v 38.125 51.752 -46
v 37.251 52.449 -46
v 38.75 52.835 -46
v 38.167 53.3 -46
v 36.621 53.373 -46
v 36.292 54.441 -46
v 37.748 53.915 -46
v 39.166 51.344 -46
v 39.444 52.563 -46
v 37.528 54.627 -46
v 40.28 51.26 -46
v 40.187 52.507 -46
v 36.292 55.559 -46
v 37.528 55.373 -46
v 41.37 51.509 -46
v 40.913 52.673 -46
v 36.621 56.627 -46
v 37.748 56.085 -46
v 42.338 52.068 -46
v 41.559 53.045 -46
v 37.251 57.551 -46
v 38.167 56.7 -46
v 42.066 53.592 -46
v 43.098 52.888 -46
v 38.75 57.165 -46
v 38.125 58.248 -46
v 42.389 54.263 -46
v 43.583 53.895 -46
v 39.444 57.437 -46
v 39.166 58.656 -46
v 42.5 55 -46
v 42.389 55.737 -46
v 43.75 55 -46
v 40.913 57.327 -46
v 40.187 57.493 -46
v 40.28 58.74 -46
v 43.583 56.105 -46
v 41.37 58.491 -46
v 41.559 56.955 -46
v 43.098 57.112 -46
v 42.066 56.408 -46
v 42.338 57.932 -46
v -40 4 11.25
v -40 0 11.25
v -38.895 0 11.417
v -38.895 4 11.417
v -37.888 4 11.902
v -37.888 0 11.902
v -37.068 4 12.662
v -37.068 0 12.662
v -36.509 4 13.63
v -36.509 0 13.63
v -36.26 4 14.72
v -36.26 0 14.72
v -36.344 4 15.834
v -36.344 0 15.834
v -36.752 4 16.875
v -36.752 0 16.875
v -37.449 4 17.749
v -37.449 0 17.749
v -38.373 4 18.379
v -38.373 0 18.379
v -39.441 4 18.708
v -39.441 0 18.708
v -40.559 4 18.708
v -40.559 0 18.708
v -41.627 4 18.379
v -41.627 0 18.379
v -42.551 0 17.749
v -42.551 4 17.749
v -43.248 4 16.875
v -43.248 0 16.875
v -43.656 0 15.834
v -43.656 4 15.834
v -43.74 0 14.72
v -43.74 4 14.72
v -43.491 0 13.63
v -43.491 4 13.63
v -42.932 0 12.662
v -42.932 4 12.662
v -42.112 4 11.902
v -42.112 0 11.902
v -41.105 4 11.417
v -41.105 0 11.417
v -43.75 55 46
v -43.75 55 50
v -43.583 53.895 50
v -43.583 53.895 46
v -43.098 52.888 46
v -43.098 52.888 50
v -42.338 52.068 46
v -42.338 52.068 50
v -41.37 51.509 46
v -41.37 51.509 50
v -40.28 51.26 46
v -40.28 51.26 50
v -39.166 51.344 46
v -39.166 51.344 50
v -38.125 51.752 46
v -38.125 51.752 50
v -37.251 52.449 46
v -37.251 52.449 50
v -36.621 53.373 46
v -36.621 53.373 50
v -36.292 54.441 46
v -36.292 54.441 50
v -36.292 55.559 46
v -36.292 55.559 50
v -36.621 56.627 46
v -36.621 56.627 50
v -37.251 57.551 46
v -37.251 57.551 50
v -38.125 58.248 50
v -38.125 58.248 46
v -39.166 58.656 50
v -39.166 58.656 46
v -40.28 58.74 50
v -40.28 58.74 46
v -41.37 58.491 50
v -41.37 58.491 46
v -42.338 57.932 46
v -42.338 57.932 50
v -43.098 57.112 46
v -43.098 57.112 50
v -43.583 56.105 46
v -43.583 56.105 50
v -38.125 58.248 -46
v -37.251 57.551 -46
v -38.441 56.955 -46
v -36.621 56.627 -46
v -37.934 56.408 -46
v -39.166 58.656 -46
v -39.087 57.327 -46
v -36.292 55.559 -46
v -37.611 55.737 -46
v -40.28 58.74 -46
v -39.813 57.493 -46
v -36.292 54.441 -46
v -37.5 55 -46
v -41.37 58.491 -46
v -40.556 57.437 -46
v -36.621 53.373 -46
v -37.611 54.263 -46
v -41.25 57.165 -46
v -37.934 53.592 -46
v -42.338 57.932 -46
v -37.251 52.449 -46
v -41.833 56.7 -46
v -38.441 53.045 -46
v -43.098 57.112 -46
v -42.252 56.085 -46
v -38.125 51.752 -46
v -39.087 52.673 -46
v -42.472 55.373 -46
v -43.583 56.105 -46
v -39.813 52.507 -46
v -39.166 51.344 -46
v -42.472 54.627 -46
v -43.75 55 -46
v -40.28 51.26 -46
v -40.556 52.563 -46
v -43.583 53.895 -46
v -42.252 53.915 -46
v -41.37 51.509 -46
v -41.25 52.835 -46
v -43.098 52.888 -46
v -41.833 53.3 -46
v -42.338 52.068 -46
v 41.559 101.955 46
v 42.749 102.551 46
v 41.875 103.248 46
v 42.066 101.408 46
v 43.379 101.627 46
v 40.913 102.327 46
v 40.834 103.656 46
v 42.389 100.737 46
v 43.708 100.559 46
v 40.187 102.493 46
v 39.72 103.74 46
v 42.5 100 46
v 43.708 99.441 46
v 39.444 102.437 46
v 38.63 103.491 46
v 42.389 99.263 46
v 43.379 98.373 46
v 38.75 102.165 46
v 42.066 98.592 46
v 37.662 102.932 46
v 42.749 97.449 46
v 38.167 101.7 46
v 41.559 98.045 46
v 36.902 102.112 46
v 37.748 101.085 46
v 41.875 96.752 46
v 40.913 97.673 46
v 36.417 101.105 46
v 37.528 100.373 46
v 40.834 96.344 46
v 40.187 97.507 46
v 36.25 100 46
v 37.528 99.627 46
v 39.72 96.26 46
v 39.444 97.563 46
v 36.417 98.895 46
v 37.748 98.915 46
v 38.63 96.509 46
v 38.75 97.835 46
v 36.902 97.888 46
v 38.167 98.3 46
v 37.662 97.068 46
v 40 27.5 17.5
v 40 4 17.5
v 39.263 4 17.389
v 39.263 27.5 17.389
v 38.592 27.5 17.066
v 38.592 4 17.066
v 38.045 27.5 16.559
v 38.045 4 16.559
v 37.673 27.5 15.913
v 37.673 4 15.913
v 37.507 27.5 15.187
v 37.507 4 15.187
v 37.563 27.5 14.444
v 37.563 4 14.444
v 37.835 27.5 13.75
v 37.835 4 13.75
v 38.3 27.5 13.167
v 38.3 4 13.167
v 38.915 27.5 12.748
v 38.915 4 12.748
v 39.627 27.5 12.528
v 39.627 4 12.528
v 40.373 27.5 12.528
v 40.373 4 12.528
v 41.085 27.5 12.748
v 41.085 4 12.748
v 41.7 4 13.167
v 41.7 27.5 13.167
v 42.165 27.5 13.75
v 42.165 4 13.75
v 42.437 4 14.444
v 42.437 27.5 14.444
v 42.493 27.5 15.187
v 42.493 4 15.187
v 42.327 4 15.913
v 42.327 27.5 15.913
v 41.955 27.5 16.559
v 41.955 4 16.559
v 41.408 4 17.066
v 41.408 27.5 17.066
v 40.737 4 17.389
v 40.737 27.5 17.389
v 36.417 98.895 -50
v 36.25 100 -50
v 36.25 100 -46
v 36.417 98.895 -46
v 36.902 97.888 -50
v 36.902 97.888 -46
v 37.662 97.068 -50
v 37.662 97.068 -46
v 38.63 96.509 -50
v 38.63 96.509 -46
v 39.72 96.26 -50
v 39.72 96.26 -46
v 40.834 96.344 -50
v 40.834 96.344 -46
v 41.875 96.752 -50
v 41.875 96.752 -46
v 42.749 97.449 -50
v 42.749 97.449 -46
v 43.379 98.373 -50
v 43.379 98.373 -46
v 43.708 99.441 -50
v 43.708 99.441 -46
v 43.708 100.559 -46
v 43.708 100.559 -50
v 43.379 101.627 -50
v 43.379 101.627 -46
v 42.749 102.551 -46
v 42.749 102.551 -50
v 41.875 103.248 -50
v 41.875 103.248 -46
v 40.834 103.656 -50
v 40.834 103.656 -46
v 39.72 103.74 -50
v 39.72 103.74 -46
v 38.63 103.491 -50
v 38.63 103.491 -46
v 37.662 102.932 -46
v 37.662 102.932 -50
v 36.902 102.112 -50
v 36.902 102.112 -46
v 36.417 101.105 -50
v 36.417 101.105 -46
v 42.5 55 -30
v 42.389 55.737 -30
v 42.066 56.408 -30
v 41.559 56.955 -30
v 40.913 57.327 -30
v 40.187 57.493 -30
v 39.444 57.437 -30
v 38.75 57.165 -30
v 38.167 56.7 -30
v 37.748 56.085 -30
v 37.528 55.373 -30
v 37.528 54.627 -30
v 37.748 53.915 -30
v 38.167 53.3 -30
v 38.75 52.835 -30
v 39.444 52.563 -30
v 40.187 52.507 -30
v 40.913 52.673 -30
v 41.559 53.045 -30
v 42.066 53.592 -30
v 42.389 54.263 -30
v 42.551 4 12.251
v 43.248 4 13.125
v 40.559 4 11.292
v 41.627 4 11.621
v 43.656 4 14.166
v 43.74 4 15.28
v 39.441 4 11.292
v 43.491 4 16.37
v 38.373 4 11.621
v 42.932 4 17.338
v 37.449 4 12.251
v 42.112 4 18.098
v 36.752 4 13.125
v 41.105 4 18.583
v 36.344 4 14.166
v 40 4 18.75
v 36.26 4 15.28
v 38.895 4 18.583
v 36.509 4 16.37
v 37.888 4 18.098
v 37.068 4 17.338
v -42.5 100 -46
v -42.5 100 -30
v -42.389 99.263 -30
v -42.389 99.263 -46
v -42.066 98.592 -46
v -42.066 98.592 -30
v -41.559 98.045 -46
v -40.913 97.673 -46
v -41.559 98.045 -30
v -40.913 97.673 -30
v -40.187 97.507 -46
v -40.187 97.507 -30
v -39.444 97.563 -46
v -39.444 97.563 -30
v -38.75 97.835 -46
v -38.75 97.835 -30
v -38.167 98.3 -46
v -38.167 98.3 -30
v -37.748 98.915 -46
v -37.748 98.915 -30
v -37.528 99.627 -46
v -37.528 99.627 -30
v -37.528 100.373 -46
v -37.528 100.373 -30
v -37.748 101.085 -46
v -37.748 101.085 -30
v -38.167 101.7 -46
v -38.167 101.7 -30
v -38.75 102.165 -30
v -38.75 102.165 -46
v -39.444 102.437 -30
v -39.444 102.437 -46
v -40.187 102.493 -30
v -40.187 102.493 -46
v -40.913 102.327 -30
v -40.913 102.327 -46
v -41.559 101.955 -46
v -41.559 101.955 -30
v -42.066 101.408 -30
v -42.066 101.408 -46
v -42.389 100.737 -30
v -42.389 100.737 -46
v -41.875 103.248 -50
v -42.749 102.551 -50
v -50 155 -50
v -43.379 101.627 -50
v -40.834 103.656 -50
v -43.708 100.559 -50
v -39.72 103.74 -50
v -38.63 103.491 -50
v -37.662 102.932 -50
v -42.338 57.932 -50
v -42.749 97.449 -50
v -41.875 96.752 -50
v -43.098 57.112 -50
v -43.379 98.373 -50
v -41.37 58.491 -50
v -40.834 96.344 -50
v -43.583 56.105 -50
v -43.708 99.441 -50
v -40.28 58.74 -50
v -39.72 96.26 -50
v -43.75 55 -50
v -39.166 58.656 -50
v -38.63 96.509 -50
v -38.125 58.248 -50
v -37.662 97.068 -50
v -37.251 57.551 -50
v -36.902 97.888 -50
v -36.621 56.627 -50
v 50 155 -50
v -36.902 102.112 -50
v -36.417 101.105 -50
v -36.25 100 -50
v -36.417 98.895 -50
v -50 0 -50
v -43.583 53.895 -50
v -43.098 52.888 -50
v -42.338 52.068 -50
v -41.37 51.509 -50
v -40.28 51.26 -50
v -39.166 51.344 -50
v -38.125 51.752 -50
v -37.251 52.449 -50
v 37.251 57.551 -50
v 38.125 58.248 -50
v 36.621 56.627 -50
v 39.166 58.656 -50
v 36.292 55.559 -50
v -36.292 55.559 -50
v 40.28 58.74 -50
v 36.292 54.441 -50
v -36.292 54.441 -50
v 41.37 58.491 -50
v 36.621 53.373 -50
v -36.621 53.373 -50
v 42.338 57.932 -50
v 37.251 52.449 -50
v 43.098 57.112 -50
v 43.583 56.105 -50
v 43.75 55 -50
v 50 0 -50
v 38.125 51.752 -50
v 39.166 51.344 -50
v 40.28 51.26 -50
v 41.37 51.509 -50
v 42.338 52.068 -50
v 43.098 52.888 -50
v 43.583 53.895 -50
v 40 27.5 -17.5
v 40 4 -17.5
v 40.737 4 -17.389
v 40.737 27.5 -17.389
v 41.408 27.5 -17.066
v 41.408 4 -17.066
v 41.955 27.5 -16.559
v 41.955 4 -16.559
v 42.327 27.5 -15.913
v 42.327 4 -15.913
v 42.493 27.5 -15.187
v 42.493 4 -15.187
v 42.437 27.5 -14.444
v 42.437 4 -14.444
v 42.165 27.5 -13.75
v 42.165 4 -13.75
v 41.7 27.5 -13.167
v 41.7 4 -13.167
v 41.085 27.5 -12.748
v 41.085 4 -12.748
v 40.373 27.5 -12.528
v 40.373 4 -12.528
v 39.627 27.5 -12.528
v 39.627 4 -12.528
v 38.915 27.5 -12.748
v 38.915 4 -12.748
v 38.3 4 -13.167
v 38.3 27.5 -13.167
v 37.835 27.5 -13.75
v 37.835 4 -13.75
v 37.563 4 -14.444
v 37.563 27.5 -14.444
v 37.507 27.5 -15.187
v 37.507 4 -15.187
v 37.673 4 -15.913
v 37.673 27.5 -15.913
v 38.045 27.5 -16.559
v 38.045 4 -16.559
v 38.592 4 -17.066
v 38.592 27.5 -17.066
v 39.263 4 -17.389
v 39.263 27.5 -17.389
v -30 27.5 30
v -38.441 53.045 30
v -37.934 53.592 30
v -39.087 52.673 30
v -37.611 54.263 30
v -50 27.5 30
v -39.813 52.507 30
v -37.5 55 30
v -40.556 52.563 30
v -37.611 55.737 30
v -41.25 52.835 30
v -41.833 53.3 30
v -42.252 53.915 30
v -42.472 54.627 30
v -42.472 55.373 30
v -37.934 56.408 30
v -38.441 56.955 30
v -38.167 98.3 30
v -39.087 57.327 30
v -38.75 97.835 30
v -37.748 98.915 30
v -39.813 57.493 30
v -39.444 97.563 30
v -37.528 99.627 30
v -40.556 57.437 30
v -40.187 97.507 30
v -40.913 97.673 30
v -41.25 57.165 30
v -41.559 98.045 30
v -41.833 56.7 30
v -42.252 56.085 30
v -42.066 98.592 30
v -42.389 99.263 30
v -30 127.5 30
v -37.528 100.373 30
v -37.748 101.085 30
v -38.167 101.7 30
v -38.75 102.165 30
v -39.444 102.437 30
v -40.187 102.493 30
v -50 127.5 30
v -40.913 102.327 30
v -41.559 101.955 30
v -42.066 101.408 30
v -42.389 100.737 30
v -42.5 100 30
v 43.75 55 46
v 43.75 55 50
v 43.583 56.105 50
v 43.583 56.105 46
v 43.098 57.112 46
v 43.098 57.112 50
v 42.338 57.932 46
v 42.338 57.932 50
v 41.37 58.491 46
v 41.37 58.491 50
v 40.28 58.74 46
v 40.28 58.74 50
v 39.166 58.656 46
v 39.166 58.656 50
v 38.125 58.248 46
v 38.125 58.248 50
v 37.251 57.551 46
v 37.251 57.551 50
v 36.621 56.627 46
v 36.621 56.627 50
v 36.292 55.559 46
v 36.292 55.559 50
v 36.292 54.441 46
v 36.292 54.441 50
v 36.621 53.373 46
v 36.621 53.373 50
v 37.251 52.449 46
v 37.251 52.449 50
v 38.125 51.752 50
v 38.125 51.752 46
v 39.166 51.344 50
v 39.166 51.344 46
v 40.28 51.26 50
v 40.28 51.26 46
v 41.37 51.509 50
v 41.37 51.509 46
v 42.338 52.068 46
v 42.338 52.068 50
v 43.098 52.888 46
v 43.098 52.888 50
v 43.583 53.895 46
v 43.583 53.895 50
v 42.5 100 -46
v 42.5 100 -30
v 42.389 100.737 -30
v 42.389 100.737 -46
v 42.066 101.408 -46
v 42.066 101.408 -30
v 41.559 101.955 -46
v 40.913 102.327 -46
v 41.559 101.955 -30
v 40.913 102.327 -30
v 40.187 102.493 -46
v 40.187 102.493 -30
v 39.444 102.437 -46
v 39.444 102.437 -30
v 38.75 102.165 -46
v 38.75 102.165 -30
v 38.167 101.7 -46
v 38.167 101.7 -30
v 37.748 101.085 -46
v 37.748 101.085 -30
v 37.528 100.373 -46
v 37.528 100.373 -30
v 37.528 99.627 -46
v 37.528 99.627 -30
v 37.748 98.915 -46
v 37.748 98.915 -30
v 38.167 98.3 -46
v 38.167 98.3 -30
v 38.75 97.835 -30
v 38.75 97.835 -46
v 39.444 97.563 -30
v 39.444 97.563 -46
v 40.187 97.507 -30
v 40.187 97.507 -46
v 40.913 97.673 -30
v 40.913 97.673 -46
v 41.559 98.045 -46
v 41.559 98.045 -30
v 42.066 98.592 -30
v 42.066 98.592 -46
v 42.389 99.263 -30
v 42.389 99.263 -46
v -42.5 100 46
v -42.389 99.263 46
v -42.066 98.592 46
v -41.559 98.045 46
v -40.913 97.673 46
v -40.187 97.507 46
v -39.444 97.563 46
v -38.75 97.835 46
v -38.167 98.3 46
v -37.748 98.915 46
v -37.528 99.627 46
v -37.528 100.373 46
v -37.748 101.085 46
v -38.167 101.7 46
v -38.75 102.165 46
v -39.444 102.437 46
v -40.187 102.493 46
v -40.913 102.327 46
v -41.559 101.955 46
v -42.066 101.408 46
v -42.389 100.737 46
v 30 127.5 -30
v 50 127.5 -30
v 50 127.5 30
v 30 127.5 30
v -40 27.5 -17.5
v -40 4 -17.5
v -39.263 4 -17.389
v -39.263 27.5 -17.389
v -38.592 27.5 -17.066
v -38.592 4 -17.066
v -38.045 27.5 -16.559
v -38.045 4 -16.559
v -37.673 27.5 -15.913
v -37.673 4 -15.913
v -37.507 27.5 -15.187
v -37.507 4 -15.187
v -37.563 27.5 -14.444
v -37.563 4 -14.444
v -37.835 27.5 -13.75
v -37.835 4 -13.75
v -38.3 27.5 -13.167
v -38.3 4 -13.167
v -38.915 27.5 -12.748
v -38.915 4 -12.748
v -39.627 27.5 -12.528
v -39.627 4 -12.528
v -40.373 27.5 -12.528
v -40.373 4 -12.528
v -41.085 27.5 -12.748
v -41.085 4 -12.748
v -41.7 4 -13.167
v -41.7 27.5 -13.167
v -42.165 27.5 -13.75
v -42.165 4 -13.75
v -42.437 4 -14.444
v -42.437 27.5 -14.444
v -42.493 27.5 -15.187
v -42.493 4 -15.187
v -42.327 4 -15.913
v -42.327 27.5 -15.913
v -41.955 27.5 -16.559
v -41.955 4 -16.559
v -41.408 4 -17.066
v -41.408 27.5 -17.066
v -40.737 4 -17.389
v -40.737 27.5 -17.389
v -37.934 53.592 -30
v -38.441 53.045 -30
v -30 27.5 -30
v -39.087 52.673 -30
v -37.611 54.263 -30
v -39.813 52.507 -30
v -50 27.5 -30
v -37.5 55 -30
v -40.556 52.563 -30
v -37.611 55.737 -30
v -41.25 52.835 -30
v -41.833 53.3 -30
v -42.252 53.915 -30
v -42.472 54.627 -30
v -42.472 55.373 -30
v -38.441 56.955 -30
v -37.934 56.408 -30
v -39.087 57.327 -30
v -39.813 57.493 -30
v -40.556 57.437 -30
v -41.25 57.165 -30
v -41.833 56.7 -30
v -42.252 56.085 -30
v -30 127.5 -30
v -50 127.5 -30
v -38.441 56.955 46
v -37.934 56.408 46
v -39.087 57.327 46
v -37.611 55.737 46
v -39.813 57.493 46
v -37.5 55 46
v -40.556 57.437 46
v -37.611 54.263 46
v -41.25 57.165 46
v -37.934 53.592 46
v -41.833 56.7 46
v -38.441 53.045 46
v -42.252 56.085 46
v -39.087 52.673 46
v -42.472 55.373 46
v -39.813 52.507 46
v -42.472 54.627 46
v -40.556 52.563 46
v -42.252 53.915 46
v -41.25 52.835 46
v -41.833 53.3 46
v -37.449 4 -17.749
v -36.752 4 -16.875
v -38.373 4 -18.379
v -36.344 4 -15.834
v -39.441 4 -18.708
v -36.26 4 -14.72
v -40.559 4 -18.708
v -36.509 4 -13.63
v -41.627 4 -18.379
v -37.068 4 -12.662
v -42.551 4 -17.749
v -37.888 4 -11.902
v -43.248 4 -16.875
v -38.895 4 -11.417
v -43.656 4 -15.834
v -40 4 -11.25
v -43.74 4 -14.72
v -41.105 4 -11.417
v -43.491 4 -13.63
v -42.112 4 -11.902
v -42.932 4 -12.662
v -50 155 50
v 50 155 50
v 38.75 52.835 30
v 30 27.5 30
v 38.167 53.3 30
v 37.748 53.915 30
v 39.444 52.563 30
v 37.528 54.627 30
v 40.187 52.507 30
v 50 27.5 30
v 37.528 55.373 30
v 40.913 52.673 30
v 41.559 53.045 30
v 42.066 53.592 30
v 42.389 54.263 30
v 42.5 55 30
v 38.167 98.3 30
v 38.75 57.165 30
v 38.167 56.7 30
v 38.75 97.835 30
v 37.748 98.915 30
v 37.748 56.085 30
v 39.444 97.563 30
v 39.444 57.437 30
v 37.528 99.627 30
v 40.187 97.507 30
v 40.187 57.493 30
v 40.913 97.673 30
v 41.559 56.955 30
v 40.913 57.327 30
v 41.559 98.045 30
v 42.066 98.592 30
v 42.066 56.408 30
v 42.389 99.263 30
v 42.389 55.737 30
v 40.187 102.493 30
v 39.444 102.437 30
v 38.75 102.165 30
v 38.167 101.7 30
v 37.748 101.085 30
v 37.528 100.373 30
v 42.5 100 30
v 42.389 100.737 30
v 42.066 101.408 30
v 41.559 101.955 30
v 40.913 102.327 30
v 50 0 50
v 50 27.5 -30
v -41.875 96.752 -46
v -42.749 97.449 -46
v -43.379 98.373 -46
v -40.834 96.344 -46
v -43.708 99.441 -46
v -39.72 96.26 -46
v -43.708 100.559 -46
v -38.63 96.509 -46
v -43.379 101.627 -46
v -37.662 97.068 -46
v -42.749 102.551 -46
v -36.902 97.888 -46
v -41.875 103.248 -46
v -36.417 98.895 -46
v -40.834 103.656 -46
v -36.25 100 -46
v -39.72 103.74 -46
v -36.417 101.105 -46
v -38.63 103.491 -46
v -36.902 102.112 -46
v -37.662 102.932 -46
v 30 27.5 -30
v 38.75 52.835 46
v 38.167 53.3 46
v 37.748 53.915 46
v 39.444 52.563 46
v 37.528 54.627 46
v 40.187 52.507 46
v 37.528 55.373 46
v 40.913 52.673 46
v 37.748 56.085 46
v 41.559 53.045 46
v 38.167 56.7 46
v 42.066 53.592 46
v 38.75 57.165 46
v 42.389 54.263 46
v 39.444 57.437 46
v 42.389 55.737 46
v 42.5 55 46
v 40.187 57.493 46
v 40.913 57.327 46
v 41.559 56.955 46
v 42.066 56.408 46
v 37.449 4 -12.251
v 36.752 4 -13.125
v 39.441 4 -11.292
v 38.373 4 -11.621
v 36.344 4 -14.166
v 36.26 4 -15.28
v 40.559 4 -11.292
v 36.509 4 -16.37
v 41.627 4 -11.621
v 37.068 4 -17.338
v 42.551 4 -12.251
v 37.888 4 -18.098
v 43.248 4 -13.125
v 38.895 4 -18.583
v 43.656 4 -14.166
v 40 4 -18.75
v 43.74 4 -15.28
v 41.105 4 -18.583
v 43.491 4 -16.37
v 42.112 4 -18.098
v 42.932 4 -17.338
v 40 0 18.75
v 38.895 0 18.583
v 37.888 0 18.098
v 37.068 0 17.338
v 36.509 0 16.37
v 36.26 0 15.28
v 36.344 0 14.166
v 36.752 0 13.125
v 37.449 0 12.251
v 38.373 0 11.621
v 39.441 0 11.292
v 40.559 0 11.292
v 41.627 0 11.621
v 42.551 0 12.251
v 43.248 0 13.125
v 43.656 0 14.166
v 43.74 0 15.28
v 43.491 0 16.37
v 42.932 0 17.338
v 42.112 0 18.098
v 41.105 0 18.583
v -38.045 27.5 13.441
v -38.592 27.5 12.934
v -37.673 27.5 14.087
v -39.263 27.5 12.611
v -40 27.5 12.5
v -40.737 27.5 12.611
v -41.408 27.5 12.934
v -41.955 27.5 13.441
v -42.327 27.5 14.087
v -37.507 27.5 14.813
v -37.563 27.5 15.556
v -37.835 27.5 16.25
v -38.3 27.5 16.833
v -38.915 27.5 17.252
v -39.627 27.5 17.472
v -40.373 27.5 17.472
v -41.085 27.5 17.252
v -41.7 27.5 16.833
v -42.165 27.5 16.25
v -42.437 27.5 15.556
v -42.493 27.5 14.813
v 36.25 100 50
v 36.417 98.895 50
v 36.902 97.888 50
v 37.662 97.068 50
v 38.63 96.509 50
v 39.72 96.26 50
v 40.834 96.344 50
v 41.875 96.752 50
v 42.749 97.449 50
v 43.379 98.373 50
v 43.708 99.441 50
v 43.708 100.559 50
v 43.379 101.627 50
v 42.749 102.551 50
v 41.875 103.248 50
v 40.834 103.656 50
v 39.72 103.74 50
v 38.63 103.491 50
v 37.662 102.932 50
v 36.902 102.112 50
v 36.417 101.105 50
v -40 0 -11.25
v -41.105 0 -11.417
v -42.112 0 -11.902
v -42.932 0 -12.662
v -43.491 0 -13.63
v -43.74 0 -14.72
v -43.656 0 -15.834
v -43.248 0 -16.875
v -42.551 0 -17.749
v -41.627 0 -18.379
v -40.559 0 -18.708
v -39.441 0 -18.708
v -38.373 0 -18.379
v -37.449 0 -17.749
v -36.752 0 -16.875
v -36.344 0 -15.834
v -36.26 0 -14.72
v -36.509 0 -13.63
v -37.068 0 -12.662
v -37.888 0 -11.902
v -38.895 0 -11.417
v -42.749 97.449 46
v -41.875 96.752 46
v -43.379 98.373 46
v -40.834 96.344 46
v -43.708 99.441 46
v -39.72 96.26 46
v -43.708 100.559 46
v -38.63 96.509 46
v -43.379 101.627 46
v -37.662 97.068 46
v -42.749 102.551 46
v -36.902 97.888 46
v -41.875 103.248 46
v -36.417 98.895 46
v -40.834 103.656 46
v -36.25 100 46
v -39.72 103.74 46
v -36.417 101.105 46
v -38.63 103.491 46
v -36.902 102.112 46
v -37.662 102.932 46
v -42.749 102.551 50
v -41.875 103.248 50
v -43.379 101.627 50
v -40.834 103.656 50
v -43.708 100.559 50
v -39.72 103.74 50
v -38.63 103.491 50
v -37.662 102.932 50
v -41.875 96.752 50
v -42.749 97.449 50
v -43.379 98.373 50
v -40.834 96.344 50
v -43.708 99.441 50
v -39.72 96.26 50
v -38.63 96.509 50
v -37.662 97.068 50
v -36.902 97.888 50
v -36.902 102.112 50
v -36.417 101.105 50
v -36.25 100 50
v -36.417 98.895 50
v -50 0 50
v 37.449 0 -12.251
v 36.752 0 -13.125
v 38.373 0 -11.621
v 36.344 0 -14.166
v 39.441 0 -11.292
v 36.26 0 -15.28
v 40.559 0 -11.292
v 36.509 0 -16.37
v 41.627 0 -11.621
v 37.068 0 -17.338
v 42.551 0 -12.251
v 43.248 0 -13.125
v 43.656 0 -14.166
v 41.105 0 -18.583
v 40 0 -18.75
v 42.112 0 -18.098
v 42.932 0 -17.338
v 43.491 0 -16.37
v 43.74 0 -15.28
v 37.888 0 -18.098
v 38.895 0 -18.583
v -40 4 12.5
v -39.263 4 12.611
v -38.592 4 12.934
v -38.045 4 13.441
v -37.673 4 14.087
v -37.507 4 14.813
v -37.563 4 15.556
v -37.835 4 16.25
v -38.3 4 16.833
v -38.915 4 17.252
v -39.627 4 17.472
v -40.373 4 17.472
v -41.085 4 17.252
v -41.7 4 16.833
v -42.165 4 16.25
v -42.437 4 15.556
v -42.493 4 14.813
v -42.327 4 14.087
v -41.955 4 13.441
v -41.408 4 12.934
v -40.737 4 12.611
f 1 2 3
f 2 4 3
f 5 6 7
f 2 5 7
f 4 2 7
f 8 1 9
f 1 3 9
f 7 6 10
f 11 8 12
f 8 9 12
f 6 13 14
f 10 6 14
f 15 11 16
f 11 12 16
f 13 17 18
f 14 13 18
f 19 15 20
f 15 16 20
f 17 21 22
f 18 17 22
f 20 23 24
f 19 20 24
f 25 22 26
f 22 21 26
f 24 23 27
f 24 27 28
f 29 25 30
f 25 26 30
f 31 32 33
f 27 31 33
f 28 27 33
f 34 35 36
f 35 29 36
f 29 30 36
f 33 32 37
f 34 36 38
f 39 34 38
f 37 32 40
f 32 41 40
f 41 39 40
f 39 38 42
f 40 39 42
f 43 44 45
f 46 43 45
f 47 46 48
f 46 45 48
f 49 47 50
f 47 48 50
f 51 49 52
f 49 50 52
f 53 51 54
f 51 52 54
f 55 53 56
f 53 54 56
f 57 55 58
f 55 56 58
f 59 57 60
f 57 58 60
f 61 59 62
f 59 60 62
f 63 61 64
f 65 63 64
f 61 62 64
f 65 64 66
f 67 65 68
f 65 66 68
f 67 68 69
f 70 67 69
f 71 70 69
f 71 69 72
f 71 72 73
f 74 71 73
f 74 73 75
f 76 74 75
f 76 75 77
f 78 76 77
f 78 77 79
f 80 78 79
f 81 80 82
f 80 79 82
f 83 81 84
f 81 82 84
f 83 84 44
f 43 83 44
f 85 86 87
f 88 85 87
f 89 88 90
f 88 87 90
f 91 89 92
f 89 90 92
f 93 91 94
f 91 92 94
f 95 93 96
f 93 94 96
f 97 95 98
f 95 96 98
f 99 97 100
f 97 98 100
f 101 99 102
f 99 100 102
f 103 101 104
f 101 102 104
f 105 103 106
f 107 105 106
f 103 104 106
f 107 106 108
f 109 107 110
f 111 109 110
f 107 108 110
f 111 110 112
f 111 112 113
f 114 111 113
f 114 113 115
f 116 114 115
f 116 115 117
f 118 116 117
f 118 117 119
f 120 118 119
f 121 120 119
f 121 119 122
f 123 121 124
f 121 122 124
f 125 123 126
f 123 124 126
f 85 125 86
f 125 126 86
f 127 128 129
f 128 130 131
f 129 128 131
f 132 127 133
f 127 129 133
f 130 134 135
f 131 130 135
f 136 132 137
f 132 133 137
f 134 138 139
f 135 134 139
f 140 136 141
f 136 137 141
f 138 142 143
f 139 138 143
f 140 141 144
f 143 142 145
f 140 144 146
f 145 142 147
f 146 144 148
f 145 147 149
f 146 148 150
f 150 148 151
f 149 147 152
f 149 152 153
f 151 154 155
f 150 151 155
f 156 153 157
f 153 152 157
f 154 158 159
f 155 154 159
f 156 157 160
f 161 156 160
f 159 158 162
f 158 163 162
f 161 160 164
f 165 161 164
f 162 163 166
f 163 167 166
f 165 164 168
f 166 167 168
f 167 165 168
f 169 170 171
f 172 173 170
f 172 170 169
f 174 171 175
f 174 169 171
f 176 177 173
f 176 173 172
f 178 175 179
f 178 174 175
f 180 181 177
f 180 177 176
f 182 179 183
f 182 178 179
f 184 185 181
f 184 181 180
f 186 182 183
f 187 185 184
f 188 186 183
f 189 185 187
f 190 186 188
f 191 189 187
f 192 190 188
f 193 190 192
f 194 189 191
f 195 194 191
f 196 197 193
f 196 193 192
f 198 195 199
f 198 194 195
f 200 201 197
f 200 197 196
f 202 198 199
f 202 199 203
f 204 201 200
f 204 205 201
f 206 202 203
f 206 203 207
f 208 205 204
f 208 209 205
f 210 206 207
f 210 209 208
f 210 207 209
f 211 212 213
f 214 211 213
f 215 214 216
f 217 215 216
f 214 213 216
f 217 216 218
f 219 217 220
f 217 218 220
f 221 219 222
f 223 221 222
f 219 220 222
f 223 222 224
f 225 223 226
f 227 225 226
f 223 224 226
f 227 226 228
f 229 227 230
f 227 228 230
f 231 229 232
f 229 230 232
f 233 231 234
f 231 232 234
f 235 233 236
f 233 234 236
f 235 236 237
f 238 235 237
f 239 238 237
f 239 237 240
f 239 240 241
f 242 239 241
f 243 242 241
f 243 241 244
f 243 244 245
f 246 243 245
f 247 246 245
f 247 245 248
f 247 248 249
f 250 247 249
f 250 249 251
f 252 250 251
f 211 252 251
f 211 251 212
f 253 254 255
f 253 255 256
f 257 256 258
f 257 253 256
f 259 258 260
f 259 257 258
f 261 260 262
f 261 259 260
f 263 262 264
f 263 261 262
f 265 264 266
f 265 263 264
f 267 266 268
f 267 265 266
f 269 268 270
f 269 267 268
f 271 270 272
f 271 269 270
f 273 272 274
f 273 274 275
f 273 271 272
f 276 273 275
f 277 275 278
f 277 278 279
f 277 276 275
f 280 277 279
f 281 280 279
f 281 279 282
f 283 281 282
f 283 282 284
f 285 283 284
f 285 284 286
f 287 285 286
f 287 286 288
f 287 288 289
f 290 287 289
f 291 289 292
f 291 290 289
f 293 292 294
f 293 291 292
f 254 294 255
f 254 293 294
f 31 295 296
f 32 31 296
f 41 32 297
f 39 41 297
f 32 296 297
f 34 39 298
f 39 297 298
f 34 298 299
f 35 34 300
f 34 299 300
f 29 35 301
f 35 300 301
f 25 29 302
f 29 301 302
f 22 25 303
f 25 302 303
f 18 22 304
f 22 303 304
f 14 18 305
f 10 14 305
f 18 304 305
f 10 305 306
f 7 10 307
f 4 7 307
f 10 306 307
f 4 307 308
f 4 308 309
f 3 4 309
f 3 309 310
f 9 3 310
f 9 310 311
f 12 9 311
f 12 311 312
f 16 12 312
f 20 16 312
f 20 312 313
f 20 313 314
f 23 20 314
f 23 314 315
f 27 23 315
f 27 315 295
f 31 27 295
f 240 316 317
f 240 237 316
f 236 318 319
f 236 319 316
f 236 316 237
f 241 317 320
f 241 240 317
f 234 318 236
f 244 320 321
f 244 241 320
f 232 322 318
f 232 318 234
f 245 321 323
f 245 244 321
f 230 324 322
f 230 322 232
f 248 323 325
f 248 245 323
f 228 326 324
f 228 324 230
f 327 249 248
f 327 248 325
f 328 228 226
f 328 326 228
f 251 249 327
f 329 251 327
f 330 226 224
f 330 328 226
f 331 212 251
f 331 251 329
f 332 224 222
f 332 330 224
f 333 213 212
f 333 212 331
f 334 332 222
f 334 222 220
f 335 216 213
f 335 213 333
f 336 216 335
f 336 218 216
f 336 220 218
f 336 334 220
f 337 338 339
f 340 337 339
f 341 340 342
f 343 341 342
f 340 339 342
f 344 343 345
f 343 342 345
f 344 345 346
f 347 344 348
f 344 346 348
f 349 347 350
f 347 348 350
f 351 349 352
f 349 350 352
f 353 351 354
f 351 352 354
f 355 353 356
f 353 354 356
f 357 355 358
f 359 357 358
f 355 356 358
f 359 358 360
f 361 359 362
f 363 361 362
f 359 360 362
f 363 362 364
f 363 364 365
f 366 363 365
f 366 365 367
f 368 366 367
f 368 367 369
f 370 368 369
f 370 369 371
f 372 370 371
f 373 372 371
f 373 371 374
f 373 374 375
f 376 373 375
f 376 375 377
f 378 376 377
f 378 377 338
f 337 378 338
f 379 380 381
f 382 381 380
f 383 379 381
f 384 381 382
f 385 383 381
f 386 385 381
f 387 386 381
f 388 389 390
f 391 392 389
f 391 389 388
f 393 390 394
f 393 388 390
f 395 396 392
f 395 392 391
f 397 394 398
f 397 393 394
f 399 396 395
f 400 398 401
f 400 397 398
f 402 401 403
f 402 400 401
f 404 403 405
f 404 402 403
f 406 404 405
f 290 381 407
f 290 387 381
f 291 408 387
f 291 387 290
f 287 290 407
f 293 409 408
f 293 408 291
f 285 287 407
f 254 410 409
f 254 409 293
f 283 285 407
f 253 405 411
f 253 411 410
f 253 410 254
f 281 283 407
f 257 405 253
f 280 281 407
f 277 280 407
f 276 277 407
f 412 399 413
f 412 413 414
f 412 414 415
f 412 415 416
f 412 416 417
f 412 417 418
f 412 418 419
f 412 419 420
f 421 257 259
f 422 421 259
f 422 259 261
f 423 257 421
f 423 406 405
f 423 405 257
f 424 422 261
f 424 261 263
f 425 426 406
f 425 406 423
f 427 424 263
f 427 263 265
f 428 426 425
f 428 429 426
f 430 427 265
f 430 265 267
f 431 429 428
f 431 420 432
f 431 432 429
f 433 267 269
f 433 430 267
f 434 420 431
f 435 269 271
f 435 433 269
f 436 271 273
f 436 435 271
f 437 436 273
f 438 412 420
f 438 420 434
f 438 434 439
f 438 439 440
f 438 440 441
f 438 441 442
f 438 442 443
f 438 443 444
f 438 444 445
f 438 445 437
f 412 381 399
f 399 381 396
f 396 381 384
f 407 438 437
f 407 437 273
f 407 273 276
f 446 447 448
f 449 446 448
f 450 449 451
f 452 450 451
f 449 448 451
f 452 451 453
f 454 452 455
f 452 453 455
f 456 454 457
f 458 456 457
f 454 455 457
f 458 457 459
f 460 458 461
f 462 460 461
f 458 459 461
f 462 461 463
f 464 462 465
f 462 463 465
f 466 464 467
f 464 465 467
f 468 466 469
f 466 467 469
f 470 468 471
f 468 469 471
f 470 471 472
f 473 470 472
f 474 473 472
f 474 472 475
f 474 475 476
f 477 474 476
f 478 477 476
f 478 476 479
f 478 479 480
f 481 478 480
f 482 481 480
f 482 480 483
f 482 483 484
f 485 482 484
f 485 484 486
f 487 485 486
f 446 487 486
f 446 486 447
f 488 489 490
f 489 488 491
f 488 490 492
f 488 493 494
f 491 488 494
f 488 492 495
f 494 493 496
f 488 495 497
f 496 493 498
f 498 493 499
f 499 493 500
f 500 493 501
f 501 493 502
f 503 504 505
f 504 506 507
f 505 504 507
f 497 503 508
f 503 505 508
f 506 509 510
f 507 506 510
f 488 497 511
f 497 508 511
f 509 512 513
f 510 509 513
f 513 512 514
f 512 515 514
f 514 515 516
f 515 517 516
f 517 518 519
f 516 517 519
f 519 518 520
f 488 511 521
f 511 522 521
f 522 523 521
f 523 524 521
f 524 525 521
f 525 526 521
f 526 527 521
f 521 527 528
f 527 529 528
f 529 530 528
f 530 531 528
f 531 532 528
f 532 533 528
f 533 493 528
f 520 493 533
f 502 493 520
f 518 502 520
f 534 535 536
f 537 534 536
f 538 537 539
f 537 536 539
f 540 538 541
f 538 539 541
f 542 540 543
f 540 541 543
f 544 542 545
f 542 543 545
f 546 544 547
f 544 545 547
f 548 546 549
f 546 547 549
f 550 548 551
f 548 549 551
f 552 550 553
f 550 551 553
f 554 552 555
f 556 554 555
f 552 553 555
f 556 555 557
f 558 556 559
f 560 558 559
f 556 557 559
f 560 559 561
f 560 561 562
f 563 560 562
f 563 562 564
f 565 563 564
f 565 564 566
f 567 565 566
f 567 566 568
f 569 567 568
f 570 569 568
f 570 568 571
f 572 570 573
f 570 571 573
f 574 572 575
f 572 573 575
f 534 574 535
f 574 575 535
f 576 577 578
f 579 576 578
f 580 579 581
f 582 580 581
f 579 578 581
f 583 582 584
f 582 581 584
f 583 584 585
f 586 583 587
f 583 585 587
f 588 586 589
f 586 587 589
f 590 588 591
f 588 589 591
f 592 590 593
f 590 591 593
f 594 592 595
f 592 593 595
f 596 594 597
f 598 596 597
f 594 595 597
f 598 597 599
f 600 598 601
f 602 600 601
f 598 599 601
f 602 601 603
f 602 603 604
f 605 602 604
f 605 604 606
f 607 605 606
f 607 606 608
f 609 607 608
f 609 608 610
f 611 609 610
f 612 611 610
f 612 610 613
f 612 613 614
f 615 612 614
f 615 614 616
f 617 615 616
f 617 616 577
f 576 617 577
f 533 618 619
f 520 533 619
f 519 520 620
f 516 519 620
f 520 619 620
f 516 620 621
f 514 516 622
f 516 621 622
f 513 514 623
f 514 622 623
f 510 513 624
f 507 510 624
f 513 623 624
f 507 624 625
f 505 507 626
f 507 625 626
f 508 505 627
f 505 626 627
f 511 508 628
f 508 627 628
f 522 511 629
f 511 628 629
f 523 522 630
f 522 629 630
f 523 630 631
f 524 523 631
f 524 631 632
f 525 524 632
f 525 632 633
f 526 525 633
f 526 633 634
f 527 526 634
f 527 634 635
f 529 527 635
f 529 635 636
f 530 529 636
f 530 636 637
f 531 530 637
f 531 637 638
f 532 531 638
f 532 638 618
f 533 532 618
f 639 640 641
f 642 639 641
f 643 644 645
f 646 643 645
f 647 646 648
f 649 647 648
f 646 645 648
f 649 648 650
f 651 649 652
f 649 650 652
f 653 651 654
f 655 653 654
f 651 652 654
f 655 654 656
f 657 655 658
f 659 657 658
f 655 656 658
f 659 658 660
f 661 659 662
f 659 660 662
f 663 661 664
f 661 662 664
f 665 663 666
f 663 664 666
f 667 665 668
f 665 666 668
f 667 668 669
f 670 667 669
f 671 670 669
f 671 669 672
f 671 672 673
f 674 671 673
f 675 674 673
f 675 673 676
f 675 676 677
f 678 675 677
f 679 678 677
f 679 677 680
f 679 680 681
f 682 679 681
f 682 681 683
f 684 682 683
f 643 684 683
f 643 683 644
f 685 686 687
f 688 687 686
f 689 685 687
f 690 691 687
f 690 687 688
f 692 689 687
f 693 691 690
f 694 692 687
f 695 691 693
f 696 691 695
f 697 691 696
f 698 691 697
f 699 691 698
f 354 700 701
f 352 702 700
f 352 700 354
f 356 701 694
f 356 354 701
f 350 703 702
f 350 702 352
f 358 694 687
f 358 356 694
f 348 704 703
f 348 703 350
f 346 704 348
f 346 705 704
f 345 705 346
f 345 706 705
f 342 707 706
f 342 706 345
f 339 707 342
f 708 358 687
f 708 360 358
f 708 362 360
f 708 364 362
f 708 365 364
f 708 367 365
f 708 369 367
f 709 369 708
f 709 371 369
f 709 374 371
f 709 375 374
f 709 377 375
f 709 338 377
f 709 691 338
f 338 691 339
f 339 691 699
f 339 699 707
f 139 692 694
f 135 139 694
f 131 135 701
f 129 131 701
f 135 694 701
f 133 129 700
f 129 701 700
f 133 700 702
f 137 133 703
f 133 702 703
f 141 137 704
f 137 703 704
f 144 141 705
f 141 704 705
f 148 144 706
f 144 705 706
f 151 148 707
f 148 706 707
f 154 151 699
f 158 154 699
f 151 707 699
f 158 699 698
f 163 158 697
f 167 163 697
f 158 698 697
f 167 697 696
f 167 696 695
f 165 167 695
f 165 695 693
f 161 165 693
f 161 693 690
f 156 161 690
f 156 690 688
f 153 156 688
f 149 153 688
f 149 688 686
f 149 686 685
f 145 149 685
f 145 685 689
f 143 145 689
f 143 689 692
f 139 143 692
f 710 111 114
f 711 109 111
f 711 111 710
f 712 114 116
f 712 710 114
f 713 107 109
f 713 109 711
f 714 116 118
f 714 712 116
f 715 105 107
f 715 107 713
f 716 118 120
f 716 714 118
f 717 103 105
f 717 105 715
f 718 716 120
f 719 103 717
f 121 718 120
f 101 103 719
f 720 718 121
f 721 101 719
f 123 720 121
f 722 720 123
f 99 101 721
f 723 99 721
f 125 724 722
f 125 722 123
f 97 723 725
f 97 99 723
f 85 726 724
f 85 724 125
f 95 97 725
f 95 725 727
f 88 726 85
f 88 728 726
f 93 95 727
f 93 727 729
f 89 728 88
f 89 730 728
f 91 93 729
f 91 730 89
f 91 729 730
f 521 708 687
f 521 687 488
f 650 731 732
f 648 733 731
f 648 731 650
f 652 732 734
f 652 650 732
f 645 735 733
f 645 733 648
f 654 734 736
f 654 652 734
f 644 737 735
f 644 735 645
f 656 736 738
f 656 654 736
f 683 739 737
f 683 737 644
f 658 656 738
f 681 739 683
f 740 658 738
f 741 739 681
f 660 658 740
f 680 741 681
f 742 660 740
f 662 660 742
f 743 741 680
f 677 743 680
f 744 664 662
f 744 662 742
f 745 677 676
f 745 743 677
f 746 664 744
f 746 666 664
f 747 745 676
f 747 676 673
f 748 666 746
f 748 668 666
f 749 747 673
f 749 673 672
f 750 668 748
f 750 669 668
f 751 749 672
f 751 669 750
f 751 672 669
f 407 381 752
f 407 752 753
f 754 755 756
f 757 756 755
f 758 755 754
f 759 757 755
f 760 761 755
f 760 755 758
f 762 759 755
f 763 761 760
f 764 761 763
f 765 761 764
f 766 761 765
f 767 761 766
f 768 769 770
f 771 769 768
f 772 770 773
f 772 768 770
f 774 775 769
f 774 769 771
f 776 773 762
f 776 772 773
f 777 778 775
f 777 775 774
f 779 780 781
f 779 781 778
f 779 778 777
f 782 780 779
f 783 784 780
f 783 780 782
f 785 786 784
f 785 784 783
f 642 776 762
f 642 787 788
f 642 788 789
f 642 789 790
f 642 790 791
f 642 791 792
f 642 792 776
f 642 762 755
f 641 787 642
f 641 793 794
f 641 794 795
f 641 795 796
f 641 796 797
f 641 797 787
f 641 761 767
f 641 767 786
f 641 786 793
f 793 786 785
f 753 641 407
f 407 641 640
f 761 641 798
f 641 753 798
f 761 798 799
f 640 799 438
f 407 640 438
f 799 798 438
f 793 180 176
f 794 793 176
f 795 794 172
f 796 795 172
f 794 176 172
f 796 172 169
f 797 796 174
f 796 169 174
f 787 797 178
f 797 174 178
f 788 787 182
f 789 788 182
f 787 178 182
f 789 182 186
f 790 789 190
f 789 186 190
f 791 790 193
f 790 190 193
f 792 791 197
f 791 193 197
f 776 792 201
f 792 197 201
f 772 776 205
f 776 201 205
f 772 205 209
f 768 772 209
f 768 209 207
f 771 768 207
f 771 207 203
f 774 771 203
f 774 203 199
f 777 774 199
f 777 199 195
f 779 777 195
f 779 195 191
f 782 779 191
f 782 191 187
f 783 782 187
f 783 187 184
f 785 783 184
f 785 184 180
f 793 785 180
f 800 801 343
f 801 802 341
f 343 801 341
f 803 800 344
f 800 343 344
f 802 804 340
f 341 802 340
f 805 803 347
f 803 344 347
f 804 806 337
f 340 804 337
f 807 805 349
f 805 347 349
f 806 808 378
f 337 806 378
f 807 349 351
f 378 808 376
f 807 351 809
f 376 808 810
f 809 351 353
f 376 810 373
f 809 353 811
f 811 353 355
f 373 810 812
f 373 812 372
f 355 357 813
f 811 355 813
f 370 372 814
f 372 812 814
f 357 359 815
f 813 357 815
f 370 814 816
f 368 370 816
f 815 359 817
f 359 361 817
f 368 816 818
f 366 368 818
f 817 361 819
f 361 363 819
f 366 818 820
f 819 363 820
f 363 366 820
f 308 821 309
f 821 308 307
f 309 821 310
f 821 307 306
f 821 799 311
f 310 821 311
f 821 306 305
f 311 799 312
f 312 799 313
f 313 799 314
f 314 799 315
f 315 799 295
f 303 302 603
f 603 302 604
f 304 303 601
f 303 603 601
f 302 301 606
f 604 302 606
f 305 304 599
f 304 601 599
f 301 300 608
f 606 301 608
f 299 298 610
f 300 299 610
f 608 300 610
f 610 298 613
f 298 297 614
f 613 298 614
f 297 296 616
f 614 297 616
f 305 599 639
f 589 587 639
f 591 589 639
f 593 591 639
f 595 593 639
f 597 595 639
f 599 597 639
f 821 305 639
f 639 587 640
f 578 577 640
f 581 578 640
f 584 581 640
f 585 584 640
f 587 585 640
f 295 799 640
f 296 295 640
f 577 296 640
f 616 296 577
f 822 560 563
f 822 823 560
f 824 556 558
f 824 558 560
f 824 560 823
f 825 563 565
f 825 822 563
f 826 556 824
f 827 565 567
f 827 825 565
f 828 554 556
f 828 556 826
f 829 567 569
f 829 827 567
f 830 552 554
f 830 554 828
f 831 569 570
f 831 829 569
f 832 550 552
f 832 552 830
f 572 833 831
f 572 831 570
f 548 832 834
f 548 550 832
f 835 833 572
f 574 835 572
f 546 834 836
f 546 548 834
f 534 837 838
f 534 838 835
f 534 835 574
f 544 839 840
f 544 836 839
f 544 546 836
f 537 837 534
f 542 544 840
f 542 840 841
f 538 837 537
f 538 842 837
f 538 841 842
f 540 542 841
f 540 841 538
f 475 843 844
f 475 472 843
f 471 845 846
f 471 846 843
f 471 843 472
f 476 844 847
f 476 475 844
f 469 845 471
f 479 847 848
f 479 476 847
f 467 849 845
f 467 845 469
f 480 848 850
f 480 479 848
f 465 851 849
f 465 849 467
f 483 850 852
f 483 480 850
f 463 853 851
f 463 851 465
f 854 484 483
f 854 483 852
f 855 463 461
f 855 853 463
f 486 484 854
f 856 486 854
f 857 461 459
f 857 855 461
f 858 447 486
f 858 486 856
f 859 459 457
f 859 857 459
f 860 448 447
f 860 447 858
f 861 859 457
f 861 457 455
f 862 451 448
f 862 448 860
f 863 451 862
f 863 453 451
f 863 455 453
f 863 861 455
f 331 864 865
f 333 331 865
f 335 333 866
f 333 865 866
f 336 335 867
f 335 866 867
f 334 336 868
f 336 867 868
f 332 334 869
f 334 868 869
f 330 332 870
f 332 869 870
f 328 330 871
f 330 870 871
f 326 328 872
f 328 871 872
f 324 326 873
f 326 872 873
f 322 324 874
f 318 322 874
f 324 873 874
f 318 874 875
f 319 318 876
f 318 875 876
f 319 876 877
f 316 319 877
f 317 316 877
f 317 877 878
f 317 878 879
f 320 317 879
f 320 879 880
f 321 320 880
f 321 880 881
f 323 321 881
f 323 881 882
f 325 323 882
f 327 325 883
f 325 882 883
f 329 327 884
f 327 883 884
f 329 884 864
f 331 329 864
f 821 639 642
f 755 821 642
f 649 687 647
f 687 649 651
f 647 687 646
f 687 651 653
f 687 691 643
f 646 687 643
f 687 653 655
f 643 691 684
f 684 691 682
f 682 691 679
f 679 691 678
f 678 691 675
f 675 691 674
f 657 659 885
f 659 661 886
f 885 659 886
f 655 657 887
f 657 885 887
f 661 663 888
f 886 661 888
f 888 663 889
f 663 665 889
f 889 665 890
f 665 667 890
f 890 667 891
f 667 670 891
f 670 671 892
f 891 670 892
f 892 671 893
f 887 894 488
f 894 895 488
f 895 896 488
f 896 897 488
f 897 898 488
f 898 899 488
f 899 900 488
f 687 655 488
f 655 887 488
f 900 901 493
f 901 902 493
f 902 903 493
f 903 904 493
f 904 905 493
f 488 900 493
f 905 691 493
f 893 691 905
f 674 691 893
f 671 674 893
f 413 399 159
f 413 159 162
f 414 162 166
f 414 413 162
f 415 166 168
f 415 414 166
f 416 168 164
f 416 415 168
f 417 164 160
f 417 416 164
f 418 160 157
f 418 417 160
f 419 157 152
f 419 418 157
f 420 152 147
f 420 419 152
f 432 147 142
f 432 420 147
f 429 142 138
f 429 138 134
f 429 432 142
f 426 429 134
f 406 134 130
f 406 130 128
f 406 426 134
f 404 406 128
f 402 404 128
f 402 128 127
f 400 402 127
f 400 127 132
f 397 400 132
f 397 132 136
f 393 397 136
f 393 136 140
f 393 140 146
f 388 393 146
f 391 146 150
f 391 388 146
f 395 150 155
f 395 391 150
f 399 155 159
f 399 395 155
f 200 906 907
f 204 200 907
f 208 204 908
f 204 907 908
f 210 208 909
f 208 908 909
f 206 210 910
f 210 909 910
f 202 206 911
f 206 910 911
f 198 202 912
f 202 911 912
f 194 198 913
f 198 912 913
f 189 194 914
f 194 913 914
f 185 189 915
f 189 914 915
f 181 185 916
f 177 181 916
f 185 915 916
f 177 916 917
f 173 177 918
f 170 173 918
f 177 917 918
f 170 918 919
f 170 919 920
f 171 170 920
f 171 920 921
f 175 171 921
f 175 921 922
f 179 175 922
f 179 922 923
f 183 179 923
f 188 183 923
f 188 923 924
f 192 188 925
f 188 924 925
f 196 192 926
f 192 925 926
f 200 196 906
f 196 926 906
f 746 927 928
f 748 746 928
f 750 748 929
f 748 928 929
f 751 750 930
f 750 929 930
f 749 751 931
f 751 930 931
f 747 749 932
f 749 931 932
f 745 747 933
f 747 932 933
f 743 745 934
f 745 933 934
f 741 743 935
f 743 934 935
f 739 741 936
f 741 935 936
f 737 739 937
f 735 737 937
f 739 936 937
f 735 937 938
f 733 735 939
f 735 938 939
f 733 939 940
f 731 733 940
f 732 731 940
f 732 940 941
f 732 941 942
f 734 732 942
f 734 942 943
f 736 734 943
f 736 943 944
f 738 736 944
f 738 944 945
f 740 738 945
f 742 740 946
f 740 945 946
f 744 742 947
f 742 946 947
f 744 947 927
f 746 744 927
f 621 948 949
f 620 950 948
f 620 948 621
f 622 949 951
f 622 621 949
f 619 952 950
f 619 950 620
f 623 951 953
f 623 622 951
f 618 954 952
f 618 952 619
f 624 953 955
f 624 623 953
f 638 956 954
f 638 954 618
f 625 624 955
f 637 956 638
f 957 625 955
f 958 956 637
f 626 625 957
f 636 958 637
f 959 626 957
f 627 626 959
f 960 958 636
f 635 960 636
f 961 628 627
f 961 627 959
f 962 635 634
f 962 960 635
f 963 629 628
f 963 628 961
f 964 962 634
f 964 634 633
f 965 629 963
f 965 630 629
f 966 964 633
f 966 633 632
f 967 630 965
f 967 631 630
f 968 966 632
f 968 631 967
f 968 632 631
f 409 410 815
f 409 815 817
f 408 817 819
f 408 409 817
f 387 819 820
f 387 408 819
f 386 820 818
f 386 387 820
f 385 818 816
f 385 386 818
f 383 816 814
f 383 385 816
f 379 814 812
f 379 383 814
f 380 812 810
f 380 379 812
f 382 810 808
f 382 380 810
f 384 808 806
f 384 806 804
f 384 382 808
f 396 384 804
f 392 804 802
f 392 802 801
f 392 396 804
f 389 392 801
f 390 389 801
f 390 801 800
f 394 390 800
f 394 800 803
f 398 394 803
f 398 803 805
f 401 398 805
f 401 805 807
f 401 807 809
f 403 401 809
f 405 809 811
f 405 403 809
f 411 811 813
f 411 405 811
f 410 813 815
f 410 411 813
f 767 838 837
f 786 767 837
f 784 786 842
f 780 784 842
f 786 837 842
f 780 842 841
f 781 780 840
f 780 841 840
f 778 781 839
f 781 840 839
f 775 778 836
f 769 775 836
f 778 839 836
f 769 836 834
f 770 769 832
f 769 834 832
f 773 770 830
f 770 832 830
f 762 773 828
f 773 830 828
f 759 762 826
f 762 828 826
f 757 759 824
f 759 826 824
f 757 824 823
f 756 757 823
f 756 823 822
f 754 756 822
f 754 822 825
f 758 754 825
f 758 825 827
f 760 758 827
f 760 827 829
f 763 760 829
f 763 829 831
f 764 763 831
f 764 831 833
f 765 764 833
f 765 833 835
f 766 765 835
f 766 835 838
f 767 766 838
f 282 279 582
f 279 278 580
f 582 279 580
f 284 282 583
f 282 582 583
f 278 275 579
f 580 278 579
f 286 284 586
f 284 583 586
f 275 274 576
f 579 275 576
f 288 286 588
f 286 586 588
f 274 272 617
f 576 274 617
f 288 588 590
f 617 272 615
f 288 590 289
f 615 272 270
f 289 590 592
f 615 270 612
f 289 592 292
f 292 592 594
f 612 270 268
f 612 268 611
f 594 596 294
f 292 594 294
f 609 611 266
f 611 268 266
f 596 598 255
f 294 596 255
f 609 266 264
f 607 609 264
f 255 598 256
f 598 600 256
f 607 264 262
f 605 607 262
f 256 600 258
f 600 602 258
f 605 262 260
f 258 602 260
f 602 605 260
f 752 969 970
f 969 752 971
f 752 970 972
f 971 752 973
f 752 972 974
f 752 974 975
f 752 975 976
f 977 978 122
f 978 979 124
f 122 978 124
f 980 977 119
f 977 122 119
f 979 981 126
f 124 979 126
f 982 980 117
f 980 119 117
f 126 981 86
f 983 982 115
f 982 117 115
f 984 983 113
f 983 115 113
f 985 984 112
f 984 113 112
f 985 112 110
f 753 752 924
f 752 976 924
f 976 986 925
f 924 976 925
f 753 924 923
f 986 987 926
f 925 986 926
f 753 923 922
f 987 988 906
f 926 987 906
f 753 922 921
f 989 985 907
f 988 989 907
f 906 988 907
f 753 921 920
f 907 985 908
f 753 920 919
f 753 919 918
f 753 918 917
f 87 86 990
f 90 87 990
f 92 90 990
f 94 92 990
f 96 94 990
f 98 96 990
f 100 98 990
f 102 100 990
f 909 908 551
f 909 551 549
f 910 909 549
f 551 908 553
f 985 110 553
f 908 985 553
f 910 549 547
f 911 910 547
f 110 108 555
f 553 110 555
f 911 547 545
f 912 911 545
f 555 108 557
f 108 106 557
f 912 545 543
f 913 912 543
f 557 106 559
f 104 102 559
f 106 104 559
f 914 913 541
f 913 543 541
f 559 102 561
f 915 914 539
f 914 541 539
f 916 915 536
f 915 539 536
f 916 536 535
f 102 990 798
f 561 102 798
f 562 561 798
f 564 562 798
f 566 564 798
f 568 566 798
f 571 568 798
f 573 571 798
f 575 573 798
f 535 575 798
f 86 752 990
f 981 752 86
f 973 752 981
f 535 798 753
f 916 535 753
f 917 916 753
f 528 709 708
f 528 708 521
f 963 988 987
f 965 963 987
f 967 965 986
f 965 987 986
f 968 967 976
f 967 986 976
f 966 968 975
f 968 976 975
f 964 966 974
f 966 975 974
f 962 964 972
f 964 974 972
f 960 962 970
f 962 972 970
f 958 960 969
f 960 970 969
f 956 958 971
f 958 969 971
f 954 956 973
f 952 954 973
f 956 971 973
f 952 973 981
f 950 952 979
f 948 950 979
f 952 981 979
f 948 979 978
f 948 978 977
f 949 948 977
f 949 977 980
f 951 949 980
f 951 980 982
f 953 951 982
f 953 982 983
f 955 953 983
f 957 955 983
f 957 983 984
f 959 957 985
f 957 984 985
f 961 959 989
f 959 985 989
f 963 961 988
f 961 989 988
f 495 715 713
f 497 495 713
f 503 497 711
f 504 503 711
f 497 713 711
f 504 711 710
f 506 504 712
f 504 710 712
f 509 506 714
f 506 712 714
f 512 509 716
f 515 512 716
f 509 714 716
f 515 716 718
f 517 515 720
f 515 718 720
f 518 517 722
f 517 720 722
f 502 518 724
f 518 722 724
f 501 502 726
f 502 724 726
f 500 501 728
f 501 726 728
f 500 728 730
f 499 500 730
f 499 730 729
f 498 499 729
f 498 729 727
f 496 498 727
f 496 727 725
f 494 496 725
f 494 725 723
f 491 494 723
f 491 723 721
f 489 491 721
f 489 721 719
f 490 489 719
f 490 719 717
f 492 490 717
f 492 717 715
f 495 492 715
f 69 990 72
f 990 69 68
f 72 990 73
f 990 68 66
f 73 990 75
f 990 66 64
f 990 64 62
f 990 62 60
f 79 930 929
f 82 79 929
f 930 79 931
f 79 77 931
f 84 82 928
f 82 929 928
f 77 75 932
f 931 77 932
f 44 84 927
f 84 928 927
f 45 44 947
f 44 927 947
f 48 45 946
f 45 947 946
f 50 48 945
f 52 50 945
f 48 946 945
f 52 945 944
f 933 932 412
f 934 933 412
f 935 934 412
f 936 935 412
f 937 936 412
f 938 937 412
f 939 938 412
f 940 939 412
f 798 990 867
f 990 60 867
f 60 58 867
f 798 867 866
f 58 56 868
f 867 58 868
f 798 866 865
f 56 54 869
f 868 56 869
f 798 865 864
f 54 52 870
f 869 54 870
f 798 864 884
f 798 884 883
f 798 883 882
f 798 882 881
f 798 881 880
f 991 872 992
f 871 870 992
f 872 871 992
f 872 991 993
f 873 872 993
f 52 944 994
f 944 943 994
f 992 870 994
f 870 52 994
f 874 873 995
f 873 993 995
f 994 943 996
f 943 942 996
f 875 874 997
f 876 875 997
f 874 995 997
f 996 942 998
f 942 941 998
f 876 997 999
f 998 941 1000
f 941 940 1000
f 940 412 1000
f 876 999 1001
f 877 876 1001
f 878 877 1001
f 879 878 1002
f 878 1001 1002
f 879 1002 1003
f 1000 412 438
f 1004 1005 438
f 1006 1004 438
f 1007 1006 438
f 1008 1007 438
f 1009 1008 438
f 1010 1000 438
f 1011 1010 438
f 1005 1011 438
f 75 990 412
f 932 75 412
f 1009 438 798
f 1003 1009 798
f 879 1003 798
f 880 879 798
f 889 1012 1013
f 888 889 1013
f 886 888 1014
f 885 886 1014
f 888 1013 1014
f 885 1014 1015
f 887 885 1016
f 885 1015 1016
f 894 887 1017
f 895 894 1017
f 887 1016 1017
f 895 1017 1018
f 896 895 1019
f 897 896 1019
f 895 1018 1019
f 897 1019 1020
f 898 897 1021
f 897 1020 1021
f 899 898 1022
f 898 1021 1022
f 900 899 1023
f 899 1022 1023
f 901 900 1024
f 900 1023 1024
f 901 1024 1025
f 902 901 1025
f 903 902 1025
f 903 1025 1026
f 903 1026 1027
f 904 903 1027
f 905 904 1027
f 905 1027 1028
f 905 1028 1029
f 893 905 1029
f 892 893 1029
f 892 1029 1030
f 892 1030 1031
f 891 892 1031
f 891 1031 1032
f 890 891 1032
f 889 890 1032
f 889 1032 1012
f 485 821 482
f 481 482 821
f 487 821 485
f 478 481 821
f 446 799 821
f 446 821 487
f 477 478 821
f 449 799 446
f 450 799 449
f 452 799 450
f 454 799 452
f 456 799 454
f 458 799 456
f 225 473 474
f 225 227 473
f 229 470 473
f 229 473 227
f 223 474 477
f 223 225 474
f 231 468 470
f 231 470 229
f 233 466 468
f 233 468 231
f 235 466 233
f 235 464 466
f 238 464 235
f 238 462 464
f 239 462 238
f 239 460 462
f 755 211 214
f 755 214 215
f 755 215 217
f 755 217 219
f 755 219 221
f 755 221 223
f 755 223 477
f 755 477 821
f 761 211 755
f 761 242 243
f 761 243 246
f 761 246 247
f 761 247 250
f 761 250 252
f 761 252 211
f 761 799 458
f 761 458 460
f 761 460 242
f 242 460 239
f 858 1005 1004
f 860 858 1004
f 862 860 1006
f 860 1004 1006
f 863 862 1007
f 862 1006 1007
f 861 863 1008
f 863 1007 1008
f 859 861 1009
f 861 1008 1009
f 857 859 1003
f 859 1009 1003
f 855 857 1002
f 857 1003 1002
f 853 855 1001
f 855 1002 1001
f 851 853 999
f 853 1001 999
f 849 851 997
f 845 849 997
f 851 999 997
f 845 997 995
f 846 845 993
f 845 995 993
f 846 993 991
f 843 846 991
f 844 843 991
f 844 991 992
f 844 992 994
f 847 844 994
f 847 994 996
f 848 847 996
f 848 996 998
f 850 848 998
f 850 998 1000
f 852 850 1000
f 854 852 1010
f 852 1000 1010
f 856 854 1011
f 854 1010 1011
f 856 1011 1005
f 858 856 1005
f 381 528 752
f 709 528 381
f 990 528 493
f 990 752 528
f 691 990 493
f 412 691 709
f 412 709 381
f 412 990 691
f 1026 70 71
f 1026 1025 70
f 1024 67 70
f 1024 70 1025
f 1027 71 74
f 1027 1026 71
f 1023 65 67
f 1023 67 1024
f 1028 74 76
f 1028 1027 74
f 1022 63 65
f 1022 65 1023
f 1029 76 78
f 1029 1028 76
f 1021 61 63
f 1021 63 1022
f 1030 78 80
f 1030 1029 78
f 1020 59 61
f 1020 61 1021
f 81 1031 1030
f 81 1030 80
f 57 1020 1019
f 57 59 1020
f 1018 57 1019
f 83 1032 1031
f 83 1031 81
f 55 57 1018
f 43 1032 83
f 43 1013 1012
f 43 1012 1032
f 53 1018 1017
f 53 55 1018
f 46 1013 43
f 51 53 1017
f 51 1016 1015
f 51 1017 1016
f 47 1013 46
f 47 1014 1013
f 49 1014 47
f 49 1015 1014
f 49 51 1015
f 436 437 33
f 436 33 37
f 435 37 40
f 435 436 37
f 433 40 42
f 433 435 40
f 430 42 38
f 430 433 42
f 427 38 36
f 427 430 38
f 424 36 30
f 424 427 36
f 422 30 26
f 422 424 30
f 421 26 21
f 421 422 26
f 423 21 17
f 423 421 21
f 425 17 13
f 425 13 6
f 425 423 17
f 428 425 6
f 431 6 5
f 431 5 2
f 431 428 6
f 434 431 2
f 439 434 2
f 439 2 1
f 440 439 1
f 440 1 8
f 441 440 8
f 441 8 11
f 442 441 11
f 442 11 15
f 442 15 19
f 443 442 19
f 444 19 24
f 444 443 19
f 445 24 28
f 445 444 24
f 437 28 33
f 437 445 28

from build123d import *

# Parameters (mm, degrees)
SKETCH1_W           = 100
SKETCH1_H           = 100
BOSS_EXTRUDE1_DEPTH = 155
SKETCH2_W           = 60
SKETCH2_H           = 100
CUT_EXTRUDE1_DEPTH  = 20
SKETCH3_R           = 3.75
CUT_EXTRUDE2_DEPTH  = 4
SKETCH4_R           = 2.5
CUT_EXTRUDE3_DEPTH  = 192.115148536
SKETCH6_R           = 3.75
CUT_EXTRUDE5_DEPTH  = 4
SKETCH9_R           = 2.5
CUT_EXTRUDE7_DEPTH  = 50


with BuildPart() as part:
    # Sketch1 → Boss-Extrude1 (new body)
    with BuildSketch(Plane(origin=(0, 0, 0), x_dir=(1, 0, 0), z_dir=(0, 1, 0))):
        Rectangle(SKETCH1_W, SKETCH1_H)
    extrude(amount=BOSS_EXTRUDE1_DEPTH)

    # Sketch2 → Cut-Extrude1 (cut)
    with BuildSketch(Plane.ZY.offset(50)):
        with Locations((0, 77.5)):
            Rectangle(SKETCH2_W, SKETCH2_H)
    cut_extrude1 = extrude(amount=-CUT_EXTRUDE1_DEPTH, mode=Mode.SUBTRACT)

    # Mirror1: Cut-Extrude1 across plane
    add(cut_extrude1.mirror(Plane(origin=(0, 0, 0), x_dir=(0, 0, 1), z_dir=(1, 0, 0))), mode=Mode.SUBTRACT)

    # Sketch3 → Cut-Extrude2 (cut)
    with BuildSketch(Plane.XY.offset(50)):
        with Locations((-40, 100)):
            Circle(SKETCH3_R)
        with Locations(Location((-40, 55, 0), (0, 0, 180))):
            Circle(SKETCH3_R)
        with Locations((40, 55)):
            Circle(SKETCH3_R)
        with Locations(Location((40, 100, 0), (0, 0, 180))):
            Circle(SKETCH3_R)
    cut_extrude2 = extrude(amount=-CUT_EXTRUDE2_DEPTH, mode=Mode.SUBTRACT)

    # Mirror2: Cut-Extrude2 across plane
    add(cut_extrude2.mirror(Plane.XY), mode=Mode.SUBTRACT)

    # Sketch4 → Cut-Extrude3 (cut, through all)
    with BuildSketch(Plane.XY.offset(50)):
        with Locations(Location((-40, 100, 0), (0, 0, 180))):
            Circle(SKETCH4_R)
        with Locations((40, 100)):
            Circle(SKETCH4_R)
        with Locations((40, 55)):
            Circle(SKETCH4_R)
        with Locations((-40, 55)):
            Circle(SKETCH4_R)
    extrude(amount=-CUT_EXTRUDE3_DEPTH, mode=Mode.SUBTRACT)

    # Sketch6 → Cut-Extrude5 (cut)
    with BuildSketch(Plane.XZ):
        with Locations(Location((-40, 15, 0), (0, 0, 270))):
            Circle(SKETCH6_R)
        with Locations(Location((40, 15, 0), (0, 0, 90))):
            Circle(SKETCH6_R)
        with Locations(Location((40, -15, 0), (0, 0, 270))):
            Circle(SKETCH6_R)
        with Locations(Location((-40, -15, 0), (0, 0, 90))):
            Circle(SKETCH6_R)
    extrude(amount=-CUT_EXTRUDE5_DEPTH, mode=Mode.SUBTRACT)

    # Sketch9 → Cut-Extrude7 (cut)
    with BuildSketch(Plane.XZ):
        with Locations(Location((-40, 15, 0), (0, 0, 270))):
            Circle(SKETCH9_R)
        with Locations(Location((40, 15, 0), (0, 0, 90))):
            Circle(SKETCH9_R)
        with Locations(Location((40, -15, 0), (0, 0, 270))):
            Circle(SKETCH9_R)
        with Locations(Location((-40, -15, 0), (0, 0, 270))):
            Circle(SKETCH9_R)
    extrude(amount=-CUT_EXTRUDE7_DEPTH, mode=Mode.SUBTRACT)


solid = part.part
